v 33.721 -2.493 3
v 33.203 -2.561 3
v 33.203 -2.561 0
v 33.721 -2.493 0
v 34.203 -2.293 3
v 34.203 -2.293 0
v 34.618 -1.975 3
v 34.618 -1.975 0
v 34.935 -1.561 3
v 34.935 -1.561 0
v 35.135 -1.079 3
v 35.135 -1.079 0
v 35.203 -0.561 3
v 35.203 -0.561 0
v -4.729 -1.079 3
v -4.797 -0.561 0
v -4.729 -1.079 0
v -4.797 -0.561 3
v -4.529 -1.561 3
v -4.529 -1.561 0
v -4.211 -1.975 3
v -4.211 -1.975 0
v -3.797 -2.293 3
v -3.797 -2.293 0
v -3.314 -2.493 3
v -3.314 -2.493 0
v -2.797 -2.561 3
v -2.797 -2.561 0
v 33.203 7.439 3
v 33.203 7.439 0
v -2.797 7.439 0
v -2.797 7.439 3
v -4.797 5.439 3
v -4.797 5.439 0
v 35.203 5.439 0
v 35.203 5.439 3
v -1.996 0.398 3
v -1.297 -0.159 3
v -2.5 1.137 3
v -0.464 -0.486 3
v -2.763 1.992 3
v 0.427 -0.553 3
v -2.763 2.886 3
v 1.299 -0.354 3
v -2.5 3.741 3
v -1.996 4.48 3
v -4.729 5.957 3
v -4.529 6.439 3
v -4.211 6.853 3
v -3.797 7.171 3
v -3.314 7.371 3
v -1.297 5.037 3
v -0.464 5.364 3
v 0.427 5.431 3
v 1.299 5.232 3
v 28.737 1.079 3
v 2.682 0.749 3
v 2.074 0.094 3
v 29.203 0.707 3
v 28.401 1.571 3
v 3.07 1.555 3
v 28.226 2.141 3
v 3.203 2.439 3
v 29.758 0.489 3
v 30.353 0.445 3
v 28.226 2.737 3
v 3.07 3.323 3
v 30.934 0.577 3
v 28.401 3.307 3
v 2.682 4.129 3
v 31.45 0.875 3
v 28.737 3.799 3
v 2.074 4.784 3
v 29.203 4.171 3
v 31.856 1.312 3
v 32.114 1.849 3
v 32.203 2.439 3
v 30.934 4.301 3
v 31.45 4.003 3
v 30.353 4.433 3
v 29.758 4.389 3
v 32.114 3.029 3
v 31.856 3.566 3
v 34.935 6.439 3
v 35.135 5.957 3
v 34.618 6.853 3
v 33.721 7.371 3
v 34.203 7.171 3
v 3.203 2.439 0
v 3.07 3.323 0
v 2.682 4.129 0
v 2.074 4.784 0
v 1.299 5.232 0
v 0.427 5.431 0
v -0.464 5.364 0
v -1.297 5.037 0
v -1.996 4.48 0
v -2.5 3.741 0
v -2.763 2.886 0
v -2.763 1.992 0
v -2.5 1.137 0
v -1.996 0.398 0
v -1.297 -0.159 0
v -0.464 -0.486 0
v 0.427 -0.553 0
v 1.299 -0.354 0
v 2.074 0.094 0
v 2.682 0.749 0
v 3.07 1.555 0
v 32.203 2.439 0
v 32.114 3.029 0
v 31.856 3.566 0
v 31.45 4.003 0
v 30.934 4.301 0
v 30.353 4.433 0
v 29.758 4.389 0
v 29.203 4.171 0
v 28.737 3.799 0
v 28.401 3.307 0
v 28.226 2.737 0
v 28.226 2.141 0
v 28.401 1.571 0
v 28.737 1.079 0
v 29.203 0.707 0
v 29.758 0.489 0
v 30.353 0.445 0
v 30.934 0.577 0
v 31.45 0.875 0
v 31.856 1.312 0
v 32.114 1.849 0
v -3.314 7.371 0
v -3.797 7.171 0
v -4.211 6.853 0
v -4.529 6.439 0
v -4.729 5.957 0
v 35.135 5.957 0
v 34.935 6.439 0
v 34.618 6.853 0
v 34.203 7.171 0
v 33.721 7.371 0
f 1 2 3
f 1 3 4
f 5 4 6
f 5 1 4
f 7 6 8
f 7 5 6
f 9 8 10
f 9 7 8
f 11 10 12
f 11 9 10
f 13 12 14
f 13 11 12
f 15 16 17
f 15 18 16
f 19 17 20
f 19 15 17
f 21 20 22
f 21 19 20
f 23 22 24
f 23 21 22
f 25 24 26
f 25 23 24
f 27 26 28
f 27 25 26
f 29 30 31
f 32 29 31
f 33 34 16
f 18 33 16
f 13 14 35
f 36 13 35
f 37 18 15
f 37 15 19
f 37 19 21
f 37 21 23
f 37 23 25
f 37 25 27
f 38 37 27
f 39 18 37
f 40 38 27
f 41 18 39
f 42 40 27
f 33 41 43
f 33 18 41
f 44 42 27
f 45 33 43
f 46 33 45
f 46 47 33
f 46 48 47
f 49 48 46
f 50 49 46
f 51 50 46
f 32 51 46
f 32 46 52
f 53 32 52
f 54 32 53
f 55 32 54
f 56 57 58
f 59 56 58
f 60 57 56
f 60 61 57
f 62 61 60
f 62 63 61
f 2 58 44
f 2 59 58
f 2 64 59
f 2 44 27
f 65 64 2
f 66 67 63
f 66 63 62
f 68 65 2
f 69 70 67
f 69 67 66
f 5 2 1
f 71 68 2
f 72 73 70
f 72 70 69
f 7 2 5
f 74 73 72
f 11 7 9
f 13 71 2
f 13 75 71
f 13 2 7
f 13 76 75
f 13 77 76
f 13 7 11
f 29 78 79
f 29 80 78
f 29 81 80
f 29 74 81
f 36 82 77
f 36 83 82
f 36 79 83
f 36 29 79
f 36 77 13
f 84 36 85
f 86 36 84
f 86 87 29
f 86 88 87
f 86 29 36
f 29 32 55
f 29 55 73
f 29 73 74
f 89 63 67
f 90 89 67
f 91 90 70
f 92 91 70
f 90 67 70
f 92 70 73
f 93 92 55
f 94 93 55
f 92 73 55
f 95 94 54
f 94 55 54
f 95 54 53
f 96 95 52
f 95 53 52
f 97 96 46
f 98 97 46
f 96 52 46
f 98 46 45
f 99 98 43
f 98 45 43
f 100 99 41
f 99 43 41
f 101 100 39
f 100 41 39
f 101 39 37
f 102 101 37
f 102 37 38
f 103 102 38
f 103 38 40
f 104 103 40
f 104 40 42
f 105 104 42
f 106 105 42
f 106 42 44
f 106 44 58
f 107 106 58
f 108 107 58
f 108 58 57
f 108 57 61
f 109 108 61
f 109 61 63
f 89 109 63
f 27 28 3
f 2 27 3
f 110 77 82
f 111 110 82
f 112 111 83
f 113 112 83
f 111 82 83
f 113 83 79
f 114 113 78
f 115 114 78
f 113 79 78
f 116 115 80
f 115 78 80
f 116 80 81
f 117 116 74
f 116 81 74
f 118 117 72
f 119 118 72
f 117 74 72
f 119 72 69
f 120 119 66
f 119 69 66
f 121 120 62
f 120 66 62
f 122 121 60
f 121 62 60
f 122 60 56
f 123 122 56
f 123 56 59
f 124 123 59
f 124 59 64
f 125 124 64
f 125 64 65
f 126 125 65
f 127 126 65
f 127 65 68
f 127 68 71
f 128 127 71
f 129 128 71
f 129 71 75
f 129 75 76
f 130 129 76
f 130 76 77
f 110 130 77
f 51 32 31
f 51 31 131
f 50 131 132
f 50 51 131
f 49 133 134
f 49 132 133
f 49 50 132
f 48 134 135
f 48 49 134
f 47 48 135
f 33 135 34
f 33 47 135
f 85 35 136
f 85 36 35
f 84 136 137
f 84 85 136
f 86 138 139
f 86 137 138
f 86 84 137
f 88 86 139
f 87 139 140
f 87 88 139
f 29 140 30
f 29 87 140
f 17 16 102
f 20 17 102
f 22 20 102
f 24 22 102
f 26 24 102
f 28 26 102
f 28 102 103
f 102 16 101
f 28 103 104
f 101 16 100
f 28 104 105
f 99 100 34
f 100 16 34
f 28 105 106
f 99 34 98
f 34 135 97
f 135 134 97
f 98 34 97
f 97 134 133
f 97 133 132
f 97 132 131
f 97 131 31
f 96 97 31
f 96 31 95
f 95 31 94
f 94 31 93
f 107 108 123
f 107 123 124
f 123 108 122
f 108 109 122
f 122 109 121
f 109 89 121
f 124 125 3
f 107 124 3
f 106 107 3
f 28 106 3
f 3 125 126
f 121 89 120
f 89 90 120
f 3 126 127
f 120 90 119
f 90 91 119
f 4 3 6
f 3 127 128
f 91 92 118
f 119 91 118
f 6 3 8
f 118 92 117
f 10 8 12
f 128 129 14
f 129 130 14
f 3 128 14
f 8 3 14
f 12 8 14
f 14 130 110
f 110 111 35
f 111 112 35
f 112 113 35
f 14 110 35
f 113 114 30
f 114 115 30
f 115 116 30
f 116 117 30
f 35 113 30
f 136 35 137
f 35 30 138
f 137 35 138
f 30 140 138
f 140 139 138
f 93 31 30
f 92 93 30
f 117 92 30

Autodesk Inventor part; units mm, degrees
ref_plane "YZ Plane" through (0, 0, 0) normal (1, 0, 0) x (0, 1, 0)
ref_plane "XZ Plane" through (0, 0, 0) normal (0, 1, 0) x (-1, 0, 0)
ref_plane "XY Plane" through (0, 0, 0) normal (0, 0, 1) x (1, 0, 0)
sketch "Эскиз1" plane through (0, 0, 0) normal (0, 0, 1) x (1, 0, 0)
  line L0 (-4.7967, -2.561) -> (35.2033, -2.561)
  line L1 (35.2033, -2.561) -> (35.2033, 7.439)
  line L2 (35.2033, 7.439) -> (-4.7967, 7.439)
  line L3 (-4.7967, 7.439) -> (-4.7967, -2.561)
  point P0 (0, 0)
  dimension "d0" = 10
  dimension "d1" = 40
extrude "Выдавливание1" add sketch "Эскиз1" along normal blind 3
sketch "Эскиз2" plane through (0, 0, 3) normal (0, 0, 1) x (1, 0, 0)
  line L0 (-4.7967, 7.439) -> (-4.7967, -2.561) projected
  circle A0 centre (0.2033, 2.439) radius 3
  circle A1 centre (30.2033, 2.439) radius 2
  line L1 (35.2033, -2.561) -> (35.2033, 7.439) projected
  point P0 (0, 0)
  point P1 (-4.7967, 2.439)
  dimension "d4" = 6
  dimension "d5" = 5
  dimension "d6" = 4
  dimension "d7" = 5
extrude "Выдавливание2" cut sketch "Эскиз2" against normal blind 10
fillet "Сопряжение1" radius 2 4 edges at (-4.7967, 7.439, 1.5) (-4.7967, -2.561, 1.5) (35.2033, -2.561, 1.5) (35.2033, 7.439, 1.5)
properties part number "лапка сервы"
